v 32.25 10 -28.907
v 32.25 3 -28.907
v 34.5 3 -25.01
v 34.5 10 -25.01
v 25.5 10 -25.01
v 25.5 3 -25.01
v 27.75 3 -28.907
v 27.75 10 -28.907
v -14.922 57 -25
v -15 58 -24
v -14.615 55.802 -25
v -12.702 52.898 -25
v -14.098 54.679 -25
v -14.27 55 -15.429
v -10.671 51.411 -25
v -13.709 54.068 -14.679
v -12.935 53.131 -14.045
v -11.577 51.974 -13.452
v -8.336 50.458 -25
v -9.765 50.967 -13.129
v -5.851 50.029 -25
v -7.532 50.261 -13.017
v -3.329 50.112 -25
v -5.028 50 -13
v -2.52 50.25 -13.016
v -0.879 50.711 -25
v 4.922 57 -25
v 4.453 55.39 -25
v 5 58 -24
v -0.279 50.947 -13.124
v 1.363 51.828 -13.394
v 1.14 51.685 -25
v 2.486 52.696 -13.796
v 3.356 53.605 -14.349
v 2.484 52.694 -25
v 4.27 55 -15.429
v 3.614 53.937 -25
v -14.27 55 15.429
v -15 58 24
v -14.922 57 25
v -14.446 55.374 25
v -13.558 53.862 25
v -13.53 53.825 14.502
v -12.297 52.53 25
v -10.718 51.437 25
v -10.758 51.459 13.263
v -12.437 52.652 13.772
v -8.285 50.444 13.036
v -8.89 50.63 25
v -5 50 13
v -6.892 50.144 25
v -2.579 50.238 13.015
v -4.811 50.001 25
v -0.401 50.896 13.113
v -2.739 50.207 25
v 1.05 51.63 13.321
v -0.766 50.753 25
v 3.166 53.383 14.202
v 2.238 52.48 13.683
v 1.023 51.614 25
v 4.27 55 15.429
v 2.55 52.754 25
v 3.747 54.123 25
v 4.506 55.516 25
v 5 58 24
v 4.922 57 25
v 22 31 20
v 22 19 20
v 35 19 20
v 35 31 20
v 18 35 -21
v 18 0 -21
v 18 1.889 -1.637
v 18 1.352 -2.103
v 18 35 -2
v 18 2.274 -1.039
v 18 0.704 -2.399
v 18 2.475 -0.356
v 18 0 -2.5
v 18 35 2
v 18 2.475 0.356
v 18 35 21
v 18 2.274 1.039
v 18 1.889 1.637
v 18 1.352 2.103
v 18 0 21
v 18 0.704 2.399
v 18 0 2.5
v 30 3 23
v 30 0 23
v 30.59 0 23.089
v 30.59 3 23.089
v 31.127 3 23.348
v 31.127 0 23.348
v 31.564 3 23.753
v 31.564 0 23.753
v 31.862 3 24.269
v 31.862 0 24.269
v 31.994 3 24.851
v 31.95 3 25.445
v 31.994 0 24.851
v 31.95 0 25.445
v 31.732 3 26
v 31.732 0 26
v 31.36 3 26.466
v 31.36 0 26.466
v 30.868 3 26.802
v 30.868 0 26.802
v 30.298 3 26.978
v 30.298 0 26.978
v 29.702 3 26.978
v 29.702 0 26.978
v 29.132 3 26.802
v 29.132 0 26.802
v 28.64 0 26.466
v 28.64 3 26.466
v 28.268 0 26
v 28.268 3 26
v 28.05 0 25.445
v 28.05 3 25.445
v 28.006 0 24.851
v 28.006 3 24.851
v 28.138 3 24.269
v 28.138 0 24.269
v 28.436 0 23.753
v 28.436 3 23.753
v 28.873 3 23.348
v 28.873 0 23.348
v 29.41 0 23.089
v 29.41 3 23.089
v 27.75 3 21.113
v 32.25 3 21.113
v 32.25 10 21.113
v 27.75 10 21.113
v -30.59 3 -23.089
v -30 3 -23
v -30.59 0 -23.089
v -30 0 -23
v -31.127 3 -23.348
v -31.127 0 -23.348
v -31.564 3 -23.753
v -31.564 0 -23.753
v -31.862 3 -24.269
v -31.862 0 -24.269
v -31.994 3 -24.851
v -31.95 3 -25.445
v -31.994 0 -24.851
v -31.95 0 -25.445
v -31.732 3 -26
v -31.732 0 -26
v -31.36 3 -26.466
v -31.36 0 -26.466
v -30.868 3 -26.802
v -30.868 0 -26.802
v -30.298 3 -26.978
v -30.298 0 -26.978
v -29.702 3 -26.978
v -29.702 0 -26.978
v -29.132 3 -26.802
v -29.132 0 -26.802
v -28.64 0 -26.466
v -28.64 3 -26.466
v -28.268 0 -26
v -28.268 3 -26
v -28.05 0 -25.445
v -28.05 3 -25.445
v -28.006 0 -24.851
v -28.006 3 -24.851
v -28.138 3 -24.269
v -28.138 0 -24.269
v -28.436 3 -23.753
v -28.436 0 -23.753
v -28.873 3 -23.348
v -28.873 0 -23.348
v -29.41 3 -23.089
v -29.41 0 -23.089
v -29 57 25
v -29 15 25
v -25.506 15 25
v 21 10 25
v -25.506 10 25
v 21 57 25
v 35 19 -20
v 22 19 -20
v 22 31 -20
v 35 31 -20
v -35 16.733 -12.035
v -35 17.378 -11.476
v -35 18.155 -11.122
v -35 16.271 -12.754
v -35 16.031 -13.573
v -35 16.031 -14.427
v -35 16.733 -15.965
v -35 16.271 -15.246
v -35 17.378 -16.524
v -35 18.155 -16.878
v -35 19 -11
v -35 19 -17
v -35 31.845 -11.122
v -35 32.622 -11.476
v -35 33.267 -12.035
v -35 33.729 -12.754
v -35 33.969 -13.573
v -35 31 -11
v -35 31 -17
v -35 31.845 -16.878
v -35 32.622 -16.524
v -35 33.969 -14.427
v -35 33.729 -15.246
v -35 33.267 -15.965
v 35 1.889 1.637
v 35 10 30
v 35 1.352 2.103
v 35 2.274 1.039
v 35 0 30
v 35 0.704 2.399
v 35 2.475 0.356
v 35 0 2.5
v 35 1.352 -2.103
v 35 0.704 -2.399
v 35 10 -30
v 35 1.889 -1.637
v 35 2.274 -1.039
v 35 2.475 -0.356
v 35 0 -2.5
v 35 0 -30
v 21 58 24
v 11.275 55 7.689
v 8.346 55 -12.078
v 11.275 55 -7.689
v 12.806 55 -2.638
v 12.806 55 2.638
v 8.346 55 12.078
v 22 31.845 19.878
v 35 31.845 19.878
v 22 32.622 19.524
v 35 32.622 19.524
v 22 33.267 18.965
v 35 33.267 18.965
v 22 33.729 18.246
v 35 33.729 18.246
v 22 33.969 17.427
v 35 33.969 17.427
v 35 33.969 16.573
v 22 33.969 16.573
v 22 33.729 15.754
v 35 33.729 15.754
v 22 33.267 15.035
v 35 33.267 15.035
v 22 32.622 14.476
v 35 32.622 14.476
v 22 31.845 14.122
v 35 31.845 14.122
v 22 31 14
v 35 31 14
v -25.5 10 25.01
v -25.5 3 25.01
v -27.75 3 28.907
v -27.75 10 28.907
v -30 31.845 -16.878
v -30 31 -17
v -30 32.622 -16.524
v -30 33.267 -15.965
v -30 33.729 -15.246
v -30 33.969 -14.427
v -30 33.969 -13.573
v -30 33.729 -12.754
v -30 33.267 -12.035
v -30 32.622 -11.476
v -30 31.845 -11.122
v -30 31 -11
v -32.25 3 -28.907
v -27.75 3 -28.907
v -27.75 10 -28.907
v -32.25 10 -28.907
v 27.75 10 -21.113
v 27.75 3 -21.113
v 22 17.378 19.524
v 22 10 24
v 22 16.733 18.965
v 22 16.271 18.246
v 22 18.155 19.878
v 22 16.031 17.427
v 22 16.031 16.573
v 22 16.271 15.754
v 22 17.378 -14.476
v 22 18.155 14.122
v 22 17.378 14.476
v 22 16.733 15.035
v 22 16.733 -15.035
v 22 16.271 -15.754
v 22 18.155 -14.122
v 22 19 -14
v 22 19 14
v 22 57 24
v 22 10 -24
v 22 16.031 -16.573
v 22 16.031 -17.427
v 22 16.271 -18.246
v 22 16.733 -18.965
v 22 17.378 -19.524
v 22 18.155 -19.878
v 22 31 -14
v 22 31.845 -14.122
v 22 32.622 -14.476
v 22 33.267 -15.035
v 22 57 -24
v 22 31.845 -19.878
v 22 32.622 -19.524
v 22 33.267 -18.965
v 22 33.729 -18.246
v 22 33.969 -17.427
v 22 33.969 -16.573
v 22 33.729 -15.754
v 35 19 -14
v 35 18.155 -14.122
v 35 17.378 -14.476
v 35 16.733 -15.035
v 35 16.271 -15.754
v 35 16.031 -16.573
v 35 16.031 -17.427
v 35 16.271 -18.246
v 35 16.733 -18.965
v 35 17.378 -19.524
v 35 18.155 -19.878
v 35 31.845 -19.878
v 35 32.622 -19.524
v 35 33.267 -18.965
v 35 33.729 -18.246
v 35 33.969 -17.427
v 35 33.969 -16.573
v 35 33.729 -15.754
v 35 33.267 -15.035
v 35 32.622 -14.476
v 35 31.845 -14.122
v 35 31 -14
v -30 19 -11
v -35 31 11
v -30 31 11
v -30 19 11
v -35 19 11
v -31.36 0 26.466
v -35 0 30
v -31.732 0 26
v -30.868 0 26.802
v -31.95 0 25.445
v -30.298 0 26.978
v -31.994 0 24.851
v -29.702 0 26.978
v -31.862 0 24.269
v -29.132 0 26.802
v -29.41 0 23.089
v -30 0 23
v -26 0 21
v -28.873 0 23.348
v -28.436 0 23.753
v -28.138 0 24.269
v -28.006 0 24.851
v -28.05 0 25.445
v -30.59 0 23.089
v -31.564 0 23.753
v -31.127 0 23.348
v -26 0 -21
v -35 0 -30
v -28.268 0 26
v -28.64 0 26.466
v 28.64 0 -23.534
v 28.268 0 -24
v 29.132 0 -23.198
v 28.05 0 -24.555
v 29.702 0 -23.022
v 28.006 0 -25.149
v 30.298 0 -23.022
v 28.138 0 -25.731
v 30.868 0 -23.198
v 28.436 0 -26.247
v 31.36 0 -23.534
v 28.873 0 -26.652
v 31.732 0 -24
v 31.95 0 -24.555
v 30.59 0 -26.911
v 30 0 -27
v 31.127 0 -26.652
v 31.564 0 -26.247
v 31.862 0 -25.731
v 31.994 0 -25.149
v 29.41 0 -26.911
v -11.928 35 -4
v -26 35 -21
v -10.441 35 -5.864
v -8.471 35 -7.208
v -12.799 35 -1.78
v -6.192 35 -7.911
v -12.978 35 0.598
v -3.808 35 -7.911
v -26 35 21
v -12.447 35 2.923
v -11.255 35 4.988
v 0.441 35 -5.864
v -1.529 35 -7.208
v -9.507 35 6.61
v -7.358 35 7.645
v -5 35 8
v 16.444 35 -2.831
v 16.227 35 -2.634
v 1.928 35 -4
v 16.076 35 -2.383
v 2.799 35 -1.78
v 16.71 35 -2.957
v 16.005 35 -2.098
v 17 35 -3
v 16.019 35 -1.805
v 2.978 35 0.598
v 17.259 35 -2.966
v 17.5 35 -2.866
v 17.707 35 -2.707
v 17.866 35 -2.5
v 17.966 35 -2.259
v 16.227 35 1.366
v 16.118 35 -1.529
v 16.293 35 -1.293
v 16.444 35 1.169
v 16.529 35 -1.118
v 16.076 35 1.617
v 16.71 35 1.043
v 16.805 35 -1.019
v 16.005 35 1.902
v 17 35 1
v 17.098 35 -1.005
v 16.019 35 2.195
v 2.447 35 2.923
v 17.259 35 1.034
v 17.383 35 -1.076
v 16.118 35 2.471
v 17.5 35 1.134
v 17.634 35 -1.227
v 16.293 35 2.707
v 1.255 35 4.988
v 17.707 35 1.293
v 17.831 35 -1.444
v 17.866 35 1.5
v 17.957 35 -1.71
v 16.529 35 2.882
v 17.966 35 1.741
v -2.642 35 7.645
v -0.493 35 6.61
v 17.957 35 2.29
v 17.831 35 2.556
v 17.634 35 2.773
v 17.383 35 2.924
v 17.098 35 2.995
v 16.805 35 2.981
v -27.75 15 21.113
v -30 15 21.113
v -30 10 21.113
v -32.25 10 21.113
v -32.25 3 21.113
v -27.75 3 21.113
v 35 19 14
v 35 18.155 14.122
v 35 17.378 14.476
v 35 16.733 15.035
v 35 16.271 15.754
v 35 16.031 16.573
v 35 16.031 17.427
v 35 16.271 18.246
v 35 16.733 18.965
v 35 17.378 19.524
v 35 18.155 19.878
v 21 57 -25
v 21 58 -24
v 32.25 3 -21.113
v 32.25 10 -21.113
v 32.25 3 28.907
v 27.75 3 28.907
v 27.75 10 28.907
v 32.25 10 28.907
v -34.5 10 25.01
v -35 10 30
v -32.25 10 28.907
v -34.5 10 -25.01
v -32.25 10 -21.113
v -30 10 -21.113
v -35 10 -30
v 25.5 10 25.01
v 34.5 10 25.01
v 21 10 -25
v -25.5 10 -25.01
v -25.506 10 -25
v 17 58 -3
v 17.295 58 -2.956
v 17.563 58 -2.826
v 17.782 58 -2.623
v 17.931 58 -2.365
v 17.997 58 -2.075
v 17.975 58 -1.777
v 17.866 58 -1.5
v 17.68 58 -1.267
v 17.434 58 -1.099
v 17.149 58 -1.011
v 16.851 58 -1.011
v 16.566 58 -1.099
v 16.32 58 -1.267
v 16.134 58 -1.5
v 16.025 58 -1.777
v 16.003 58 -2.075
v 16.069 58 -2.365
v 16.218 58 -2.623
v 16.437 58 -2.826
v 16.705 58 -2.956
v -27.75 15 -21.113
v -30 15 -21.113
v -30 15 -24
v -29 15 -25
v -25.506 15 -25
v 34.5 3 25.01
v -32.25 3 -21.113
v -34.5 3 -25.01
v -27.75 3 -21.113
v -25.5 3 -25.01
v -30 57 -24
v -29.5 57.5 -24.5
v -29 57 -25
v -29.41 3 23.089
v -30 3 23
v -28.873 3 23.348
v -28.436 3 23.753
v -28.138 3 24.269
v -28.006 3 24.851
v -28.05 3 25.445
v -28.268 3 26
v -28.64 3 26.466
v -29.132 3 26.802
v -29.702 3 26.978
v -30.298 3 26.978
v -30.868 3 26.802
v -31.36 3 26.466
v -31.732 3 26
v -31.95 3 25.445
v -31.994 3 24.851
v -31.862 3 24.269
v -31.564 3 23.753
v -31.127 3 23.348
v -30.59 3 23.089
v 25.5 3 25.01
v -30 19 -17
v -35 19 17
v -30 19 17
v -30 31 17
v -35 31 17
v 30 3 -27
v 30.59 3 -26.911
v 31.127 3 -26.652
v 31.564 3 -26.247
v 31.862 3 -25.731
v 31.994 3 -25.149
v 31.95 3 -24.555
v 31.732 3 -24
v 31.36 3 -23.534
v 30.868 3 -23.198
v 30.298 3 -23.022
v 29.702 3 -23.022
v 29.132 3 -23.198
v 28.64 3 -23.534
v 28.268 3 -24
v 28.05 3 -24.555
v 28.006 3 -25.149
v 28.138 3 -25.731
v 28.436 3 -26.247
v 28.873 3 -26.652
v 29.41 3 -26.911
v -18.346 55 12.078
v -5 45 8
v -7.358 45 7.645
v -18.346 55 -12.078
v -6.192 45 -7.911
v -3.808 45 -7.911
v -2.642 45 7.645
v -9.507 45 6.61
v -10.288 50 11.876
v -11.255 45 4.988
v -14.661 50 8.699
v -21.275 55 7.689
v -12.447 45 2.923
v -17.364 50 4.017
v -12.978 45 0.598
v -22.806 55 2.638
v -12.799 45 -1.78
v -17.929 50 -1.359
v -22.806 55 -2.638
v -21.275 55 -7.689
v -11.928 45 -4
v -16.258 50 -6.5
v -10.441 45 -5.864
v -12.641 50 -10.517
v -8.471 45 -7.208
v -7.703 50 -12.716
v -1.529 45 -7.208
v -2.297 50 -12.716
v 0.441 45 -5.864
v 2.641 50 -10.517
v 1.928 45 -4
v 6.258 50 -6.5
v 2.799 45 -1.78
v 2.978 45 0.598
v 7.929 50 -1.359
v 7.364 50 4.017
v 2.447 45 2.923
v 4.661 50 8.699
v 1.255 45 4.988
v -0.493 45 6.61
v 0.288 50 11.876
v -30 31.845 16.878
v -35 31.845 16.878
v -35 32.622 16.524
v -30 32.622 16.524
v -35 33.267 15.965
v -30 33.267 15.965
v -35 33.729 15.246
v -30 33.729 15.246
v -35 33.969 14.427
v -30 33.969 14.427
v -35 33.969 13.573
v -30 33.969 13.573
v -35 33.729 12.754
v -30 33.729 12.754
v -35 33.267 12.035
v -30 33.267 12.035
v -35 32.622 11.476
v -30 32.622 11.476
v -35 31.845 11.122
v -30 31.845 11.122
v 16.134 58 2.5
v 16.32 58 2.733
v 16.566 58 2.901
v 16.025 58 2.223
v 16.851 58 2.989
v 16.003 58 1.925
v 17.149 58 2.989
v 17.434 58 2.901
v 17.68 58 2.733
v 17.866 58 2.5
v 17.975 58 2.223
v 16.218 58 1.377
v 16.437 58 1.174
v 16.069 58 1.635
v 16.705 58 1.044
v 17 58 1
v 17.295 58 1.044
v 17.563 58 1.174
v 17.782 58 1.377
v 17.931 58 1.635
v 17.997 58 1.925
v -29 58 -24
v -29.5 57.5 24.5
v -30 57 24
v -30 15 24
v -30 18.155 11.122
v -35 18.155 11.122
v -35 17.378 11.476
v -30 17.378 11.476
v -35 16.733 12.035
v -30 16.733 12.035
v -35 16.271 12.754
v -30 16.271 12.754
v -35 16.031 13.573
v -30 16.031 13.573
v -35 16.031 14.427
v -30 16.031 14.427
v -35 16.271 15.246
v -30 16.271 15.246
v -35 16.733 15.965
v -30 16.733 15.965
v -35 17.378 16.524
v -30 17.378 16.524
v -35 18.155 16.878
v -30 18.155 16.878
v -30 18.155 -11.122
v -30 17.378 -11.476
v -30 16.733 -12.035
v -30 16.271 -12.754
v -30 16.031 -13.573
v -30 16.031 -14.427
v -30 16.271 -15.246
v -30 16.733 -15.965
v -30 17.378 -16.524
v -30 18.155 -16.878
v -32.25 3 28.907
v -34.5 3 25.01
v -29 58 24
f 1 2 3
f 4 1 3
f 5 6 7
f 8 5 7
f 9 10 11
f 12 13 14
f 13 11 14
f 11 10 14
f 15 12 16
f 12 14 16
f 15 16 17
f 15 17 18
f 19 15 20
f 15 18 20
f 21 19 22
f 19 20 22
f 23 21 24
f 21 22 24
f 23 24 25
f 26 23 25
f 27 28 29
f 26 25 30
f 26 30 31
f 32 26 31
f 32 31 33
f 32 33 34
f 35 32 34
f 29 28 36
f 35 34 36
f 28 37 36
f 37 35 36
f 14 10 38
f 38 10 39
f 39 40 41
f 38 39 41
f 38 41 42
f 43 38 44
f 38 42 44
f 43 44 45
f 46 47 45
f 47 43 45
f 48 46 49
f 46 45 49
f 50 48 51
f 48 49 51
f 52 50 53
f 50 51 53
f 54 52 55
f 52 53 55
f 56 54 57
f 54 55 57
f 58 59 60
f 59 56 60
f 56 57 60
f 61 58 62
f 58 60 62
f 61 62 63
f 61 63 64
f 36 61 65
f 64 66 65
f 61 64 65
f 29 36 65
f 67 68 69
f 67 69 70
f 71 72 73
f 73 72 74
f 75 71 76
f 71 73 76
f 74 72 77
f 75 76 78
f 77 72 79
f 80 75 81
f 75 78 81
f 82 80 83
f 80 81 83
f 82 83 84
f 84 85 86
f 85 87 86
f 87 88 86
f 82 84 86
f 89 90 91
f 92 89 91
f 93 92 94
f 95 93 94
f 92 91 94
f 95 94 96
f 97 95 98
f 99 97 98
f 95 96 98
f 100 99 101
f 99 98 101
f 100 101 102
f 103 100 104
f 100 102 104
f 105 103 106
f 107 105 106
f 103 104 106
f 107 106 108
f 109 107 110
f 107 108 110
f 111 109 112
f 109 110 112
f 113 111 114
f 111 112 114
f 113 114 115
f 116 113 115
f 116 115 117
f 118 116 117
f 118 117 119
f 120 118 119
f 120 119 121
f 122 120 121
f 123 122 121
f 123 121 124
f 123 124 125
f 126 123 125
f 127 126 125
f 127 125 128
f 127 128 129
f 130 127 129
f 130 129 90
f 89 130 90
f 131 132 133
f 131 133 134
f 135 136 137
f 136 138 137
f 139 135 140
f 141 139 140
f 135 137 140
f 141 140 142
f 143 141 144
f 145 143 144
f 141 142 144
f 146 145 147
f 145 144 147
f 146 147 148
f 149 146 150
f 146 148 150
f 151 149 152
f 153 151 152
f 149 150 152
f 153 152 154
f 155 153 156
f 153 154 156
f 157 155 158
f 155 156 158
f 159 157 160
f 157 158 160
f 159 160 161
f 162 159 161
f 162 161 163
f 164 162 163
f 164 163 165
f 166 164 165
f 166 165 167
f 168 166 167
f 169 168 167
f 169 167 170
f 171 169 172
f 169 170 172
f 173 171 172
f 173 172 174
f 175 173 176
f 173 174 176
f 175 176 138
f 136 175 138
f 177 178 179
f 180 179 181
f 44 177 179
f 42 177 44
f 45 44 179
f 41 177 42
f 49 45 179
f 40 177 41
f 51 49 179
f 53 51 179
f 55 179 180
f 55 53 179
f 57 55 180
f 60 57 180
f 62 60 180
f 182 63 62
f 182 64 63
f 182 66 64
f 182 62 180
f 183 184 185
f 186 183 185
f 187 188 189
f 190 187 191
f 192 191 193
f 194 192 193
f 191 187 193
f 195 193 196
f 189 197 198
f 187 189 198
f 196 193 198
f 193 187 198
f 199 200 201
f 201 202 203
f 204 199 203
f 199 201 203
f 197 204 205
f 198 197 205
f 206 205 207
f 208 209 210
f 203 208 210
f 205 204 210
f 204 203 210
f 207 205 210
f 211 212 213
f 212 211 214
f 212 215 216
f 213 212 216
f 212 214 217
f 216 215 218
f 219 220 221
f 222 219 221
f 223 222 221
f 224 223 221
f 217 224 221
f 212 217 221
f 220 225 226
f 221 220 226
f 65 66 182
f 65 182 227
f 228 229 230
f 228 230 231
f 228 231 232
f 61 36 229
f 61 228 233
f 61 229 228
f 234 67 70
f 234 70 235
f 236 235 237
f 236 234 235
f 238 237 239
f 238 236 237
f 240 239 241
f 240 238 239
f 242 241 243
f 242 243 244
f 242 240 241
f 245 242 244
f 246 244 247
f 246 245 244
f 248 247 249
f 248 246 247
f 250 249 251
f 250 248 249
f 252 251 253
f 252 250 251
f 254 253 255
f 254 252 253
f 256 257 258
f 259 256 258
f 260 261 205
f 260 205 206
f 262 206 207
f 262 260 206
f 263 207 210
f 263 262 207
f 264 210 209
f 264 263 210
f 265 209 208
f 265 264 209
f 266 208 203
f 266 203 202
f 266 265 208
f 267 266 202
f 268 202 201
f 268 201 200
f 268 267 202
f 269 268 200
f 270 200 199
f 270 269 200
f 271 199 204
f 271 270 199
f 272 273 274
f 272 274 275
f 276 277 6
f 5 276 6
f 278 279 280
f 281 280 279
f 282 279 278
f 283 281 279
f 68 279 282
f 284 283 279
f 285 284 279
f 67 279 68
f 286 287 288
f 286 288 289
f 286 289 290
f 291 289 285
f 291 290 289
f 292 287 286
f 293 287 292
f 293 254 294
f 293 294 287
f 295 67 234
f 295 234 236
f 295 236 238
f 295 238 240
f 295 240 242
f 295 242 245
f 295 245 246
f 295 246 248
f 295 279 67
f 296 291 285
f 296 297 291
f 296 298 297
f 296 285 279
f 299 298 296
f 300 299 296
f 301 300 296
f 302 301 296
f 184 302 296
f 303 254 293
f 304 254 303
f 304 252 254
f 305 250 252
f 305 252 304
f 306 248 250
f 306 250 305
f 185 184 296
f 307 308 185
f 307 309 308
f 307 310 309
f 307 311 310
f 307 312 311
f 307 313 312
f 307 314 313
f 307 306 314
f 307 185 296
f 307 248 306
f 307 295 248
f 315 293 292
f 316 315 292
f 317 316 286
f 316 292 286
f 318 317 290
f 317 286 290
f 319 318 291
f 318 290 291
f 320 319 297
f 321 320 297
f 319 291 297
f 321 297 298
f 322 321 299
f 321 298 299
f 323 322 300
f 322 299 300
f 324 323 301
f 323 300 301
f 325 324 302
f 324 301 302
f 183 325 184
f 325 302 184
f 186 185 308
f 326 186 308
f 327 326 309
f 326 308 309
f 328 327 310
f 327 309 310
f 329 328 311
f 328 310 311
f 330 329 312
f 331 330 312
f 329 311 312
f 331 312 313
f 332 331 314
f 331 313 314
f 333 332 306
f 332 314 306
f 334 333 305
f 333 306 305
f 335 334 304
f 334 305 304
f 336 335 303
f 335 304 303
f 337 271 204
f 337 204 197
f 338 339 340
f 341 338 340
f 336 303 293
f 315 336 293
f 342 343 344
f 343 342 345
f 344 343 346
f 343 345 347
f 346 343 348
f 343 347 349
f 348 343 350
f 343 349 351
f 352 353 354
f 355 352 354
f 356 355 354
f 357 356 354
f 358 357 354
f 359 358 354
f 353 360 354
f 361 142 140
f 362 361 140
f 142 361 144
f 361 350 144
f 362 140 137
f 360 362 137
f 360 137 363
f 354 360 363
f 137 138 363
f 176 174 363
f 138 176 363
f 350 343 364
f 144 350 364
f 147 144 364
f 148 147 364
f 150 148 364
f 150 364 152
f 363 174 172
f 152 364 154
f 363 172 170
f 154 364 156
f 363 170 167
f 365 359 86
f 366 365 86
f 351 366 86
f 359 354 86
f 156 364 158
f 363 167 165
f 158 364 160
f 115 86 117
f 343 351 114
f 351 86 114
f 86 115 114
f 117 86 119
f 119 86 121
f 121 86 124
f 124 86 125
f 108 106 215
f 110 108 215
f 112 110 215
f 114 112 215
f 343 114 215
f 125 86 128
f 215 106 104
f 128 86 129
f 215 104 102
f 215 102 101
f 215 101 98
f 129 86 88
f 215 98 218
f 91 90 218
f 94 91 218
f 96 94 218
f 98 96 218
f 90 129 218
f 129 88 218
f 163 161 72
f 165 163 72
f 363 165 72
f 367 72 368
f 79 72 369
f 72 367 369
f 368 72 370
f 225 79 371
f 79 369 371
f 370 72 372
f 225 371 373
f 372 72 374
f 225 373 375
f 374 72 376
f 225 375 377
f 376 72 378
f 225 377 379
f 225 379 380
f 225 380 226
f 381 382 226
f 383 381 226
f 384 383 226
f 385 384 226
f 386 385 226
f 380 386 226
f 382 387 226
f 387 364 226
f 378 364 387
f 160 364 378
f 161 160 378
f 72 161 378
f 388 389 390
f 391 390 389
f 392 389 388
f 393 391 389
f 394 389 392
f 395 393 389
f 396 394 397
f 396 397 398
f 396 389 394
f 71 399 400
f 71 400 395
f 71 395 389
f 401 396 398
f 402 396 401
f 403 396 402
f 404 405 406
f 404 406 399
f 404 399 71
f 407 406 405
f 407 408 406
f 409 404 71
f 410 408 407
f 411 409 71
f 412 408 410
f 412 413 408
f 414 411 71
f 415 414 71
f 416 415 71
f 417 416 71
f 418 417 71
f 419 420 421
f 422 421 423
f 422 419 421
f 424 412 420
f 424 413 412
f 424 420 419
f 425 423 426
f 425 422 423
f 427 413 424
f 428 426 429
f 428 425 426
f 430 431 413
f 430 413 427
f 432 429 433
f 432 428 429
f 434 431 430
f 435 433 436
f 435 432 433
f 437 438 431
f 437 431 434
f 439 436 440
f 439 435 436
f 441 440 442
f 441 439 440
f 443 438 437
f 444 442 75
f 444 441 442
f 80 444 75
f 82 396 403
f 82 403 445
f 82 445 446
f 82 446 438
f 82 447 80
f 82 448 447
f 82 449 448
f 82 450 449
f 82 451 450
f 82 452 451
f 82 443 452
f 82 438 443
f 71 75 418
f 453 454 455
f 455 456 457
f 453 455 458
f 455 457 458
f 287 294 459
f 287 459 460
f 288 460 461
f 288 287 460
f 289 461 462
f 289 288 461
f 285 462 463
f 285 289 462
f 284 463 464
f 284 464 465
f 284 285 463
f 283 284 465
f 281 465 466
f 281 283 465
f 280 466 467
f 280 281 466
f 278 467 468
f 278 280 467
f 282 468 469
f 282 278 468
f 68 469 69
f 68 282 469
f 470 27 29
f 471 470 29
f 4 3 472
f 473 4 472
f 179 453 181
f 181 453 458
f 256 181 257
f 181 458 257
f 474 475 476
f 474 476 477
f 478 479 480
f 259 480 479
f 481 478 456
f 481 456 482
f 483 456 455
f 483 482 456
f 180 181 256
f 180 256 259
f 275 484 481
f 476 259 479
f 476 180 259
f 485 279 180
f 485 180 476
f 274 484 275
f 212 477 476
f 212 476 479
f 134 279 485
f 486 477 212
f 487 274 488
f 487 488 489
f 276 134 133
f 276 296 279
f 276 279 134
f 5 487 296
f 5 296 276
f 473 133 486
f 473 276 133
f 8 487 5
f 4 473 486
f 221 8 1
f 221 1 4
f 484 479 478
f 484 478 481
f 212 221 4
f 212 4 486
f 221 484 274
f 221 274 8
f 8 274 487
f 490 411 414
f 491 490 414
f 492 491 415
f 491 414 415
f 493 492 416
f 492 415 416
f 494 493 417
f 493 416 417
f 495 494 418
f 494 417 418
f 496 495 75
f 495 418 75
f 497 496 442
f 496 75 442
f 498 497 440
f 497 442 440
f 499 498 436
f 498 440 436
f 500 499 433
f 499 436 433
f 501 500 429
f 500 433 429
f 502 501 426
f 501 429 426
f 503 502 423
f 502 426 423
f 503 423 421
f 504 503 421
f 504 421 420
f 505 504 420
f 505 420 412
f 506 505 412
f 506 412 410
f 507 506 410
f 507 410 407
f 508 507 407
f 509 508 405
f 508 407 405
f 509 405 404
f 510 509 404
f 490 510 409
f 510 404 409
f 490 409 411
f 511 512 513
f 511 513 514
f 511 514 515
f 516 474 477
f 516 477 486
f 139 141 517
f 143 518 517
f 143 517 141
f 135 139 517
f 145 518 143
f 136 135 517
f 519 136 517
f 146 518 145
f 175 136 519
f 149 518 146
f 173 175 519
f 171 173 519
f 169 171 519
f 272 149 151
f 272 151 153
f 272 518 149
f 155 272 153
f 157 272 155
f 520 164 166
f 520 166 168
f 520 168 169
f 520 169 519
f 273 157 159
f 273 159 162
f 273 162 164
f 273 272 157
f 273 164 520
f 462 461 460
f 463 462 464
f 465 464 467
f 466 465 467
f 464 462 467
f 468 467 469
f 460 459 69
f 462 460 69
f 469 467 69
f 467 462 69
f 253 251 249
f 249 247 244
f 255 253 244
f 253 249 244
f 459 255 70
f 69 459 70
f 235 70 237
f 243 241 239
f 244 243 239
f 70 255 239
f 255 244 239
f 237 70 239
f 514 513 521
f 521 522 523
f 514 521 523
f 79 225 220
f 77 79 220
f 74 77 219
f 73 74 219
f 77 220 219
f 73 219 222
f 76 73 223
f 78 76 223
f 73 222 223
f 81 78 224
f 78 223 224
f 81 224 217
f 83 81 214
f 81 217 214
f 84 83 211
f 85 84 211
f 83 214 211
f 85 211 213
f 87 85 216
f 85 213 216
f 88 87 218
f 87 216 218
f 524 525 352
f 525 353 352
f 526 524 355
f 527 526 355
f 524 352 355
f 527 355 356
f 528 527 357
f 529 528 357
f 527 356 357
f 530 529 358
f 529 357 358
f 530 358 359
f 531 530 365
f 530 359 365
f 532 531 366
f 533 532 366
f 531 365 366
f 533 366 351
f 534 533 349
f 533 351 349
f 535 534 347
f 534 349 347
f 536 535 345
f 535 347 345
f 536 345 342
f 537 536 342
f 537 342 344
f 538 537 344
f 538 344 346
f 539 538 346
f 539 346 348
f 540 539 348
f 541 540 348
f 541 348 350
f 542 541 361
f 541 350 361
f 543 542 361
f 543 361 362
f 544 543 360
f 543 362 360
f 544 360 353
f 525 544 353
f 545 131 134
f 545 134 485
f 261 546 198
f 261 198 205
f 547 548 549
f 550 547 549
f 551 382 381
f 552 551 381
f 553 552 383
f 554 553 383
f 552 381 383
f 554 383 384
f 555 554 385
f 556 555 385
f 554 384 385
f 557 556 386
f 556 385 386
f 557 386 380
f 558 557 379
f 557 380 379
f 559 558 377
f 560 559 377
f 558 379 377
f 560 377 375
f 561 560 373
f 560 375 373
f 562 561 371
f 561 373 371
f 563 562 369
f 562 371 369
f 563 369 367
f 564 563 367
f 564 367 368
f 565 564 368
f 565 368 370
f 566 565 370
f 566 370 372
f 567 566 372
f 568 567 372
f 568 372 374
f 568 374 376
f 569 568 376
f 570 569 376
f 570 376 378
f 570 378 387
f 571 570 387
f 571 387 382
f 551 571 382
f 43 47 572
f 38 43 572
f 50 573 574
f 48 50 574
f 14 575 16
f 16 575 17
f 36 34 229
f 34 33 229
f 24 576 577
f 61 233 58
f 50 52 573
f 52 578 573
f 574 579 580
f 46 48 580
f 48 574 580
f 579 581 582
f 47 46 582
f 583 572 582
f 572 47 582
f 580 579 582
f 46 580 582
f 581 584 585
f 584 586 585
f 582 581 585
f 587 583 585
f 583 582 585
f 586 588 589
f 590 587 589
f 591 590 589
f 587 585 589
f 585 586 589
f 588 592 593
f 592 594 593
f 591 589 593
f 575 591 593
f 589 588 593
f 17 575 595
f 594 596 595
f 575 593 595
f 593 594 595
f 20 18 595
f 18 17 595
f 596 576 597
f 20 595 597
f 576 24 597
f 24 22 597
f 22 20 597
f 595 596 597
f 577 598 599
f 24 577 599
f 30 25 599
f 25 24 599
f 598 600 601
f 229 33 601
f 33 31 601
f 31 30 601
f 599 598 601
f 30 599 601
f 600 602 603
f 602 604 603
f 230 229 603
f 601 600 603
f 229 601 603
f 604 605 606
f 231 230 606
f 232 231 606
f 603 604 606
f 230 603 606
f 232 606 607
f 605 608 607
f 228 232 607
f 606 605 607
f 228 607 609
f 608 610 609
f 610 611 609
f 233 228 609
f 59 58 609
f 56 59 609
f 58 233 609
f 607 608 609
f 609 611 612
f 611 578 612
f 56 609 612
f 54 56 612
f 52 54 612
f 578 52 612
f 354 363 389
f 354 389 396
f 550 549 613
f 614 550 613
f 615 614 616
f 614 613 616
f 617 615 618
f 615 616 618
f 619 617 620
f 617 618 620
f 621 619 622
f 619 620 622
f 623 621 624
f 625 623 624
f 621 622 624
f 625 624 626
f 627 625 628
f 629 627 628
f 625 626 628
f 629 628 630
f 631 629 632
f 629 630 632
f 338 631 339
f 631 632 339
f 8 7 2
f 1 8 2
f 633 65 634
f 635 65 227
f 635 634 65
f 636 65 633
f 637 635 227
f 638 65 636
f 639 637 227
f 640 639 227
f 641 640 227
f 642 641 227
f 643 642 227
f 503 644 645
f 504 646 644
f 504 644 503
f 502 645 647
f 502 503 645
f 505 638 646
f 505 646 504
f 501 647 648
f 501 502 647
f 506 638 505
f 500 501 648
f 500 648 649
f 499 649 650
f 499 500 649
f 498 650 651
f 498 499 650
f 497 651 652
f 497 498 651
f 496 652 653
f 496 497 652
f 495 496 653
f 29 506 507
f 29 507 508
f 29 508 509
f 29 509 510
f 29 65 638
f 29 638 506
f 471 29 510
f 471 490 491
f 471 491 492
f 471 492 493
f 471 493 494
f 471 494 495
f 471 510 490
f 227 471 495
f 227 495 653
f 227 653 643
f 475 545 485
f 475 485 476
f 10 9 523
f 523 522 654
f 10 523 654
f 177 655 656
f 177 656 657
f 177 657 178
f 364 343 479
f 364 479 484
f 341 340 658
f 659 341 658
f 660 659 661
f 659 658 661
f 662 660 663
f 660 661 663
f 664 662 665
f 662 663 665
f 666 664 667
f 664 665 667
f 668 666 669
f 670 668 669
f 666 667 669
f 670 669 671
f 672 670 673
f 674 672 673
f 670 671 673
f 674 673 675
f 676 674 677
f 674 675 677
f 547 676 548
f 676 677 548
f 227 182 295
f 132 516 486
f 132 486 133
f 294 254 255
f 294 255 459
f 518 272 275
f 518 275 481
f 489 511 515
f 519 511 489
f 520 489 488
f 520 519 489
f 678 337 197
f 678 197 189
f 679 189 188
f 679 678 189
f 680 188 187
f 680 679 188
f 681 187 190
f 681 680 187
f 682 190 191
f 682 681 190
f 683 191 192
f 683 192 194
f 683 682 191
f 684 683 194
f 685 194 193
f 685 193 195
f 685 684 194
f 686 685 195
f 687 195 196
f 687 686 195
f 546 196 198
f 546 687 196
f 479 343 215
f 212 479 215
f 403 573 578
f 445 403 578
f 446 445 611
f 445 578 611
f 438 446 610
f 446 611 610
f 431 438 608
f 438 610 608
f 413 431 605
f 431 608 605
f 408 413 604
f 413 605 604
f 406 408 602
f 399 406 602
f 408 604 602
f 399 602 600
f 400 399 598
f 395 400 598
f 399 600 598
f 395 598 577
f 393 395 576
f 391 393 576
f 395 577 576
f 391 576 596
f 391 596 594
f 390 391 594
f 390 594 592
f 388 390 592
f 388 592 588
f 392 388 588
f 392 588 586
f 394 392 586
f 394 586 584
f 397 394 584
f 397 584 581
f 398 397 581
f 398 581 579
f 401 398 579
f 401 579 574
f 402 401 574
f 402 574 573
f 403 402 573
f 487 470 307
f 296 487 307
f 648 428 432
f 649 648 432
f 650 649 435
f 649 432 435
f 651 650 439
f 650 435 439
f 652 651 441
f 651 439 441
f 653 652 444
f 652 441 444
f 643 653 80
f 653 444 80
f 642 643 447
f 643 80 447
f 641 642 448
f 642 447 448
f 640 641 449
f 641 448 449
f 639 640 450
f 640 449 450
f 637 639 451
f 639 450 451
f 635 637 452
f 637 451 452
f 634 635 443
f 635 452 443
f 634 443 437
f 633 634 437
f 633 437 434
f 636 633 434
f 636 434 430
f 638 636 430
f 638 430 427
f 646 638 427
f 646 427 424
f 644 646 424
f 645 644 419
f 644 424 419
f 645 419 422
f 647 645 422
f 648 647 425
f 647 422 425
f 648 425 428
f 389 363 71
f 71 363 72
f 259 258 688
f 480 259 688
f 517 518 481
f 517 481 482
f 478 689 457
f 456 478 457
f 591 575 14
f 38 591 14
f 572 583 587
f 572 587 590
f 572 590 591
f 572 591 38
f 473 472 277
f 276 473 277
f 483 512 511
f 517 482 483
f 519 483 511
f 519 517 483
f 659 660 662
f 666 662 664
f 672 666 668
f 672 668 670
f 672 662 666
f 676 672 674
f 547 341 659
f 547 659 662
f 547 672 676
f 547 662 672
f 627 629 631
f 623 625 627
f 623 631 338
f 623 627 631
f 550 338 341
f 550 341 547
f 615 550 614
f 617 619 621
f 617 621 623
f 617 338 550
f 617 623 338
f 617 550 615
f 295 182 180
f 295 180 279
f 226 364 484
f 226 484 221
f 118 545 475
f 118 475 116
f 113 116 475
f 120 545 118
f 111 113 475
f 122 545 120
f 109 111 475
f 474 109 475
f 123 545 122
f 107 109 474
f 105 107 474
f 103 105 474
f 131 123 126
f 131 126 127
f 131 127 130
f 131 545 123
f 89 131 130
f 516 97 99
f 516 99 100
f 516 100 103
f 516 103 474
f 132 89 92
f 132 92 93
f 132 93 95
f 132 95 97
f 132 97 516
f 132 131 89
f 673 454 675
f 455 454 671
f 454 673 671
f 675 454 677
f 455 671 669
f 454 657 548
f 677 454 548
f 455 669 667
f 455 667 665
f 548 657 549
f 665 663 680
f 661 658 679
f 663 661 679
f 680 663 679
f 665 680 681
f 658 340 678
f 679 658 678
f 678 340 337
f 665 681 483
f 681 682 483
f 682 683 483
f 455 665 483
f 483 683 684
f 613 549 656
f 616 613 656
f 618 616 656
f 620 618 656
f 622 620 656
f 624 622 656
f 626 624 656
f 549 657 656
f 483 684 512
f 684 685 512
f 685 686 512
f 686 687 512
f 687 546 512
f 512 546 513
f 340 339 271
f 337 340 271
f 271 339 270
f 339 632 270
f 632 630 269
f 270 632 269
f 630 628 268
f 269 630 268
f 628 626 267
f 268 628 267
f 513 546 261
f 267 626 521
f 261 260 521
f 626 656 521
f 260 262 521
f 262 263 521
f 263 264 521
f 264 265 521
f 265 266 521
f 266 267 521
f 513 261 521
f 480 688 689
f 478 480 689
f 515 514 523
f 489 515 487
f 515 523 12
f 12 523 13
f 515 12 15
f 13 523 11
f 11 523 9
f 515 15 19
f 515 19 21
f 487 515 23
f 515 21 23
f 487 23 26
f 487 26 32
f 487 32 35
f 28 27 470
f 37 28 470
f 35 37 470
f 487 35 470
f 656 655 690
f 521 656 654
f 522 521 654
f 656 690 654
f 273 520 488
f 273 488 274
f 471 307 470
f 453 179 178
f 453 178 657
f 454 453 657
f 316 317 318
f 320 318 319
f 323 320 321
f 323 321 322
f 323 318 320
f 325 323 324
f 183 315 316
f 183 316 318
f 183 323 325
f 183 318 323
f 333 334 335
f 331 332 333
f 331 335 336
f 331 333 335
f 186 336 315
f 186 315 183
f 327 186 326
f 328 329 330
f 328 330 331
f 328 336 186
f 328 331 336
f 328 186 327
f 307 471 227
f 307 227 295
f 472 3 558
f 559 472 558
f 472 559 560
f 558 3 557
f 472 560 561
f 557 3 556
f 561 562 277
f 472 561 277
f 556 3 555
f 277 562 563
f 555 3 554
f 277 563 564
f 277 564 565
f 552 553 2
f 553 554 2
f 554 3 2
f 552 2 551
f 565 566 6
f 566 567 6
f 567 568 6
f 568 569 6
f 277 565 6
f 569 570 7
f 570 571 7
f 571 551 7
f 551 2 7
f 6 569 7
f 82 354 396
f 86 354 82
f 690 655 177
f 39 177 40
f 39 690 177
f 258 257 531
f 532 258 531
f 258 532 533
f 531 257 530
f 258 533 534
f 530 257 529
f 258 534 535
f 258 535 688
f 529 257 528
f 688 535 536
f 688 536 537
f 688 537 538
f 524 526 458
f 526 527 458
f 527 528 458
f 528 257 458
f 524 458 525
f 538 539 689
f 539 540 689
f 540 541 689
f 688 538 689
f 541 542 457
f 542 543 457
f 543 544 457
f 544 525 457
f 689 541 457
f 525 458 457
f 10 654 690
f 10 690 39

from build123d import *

# Parameters (mm, degrees)
SKETCH_1_W               = 70
SKETCH_1_H               = 60
EXTRUDE_1_DEPTH          = 58
SKETCH_2_W               = 44
SKETCH_2_H               = 42
CUT_EXTRUDE_1_DEPTH      = 35
SKETCH_3_W               = 70
SKETCH_3_H               = 60
SKETCH_3_W_2             = 52
SKETCH_3_H_2             = 50
CUT_EXTRUDE_3_DEPTH      = 48
SKETCH_4_R               = 8
CUT_EXTRUDE_4_DEPTH      = 75.087785768
SKETCH_5_RX              = 10
SKETCH_5_RY              = 8
CUT_EXTRUDE_5_DEPTH      = 88.258237433
SKETCH_6_R               = 8
CUT_EXTRUDE_6_DEPTH      = 10
CUT_EXTRUDE_6_DRAFT      = 45
EXTRUDE_2_DEPTH          = 5
EXTRUDE_3_DEPTH          = 13
SKETCH_11_R              = 1
CUT_EXTRUDE_7_DEPTH      = 58.879184514
CUT_EXTRUDE_8_REACH      = 97.729
SKETCH_13_R              = 2.5
CHAMFER_1_SIZE           = 1
CUT_EXTRUDE_9_DEPTH      = 5
CUT_EXTRUDE_9_DEPTH_BACK = 7
CUT_EXTRUDE_11_REACH     = 76.088
SKETCH_15_R              = 2


with BuildPart() as part:
    # 草图1 → 凸台-拉伸1 (new body)
    with BuildSketch(Plane(origin=(0, 0, 0), x_dir=(1, 0, 0), z_dir=(0, 1, 0))):
        Rectangle(SKETCH_1_W, SKETCH_1_H)
    extrude(amount=EXTRUDE_1_DEPTH)

    # 草图2 → 切除-拉伸1 (cut)
    with BuildSketch(Plane.XZ):
        with Locations((-4, 0)):
            Rectangle(SKETCH_2_W, SKETCH_2_H)
    extrude(amount=-CUT_EXTRUDE_1_DEPTH, mode=Mode.SUBTRACT)

    # 草图3 → 切除-拉伸3 (cut)
    with BuildSketch(Plane(origin=(0, 58, 0), x_dir=(1, 0, 0), z_dir=(0, 1, 0))):
        Rectangle(SKETCH_3_W, SKETCH_3_H)
        with Locations((-4, 0)):
            Rectangle(SKETCH_3_W_2, SKETCH_3_H_2, mode=Mode.SUBTRACT)
    extrude(amount=-CUT_EXTRUDE_3_DEPTH, mode=Mode.SUBTRACT)

    # 草图4 → 切除-拉伸4 (cut, through all)
    with BuildSketch(Plane(origin=(0, 58, 0), x_dir=(1, 0, 0), z_dir=(0, 1, 0))):
        with Locations(Location((-5, 0, 0), (0, 0, 270))):
            Circle(SKETCH_4_R)
    extrude(amount=-CUT_EXTRUDE_4_DEPTH, mode=Mode.SUBTRACT)

    # 草图5 → 切除-拉伸5 (cut, through all)
    with BuildSketch(Plane.XY.offset(25)):
        with Locations((-5, 58)):
            Ellipse(SKETCH_5_RX, SKETCH_5_RY)
    extrude(amount=-CUT_EXTRUDE_5_DEPTH, mode=Mode.SUBTRACT)


with BuildPart() as cut_extrude_6_tool:
    # 草图6 → 切除-拉伸6 (with draft: the straight prism first)
    with BuildSketch(Plane(origin=(0, 45, 0), x_dir=(-1, 0, 0), z_dir=(0, -1, 0))):
        with Locations(Location((5, 0, 0), (0, 0, 270))):
            Circle(SKETCH_6_R)
    extrude(amount=-CUT_EXTRUDE_6_DEPTH)
    # 切除-拉伸6: the draft: its side faces are tilted about the plane it starts from
    cut_extrude_6_sides = [cut_extrude_6_tool.faces().sort_by_distance(p)[0] for p in [
        (-5, 50, -8),
    ]]
    draft(cut_extrude_6_sides, Plane(origin=(0, 45, 0), x_dir=(-1, 0, 0), z_dir=(0, -1, 0)), CUT_EXTRUDE_6_DRAFT)


with BuildPart() as part_1:
    add(part.part)

    # 切除-拉伸6: cut by cut_extrude_6_tool
    add(cut_extrude_6_tool.part, mode=Mode.SUBTRACT)

    # 草图9 → 凸台-拉伸2 (add)
    with BuildSketch(Plane.ZY.offset(30)):
        with BuildLine():
            Line((-11, 31), (-11, 19))
            ThreePointArc((-11, 19), (-14, 16), (-17, 19))
            Line((-17, 19), (-17, 31))
            ThreePointArc((-17, 31), (-14, 34), (-11, 31))
        make_face()
        with BuildLine():
            Line((11, 31), (11, 19))
            ThreePointArc((11, 19), (14, 16), (17, 19))
            Line((17, 19), (17, 31))
            ThreePointArc((17, 31), (14, 34), (11, 31))
        make_face()
    extrude(amount=EXTRUDE_2_DEPTH)

    # 草图10 → 凸台-拉伸3 (add)
    with BuildSketch(Plane(origin=(22, 0, 0), x_dir=(0, 0, -1), z_dir=(1, 0, 0))):
        with BuildLine():
            Line((-14, 31), (-14, 19))
            ThreePointArc((-14, 19), (-17, 16), (-20, 19))
            Line((-20, 19), (-20, 31))
            ThreePointArc((-20, 31), (-17, 34), (-14, 31))
        make_face()
        with BuildLine():
            Line((14, 31), (14, 19))
            ThreePointArc((14, 19), (17, 16), (20, 19))
            Line((20, 19), (20, 31))
            ThreePointArc((20, 31), (17, 34), (14, 31))
        make_face()
    extrude(amount=EXTRUDE_3_DEPTH)

    # 草图11 → 切除-拉伸7 (cut, through all)
    with BuildSketch(Plane.XZ.offset(-35)):
        with Locations(Location((17, -2, 0), (0, 0, 270))):
            Circle(SKETCH_11_R)
        with Locations(Location((17, 2, 0), (0, 0, 270))):
            Circle(SKETCH_11_R)
    extrude(amount=-CUT_EXTRUDE_7_DEPTH, mode=Mode.SUBTRACT)

    # 草图13 → 切除-拉伸8 (cut, up to next)
    with BuildSketch(Plane(origin=(35, 0, 0), x_dir=(0, 0, -1), z_dir=(1, 0, 0)), mode=Mode.PRIVATE) as cut_extrude_8_sk1:
        Circle(SKETCH_13_R)
    cut_extrude_8_tool1 = extrude(cut_extrude_8_sk1.sketch, amount=-CUT_EXTRUDE_8_REACH, mode=Mode.PRIVATE) & part_1.part
    add(cut_extrude_8_tool1.solids().sort_by_distance((35, 0, 0))[0], mode=Mode.SUBTRACT)

    # 倒角1
    chamfer_1_edges = [part_1.edges().sort_by_distance(p)[0] for p in [
        (-30, 58, 0),
        (-22.5, 58, 25),
    ]]
    chamfer(chamfer_1_edges, length=CHAMFER_1_SIZE)

    # 倒角2
    # the kernel refuses this chamfer: 1 mm, written as the material it takes off along each edge
    with BuildSketch(Plane(origin=(21.333333333, 57.333333333, -24.333333333), x_dir=(-0.7071067811865475, 0, -0.7071067811865475), z_dir=(0.5773502691896258, 0.5773502691896258, -0.5773502691896258))) as chamfer_2_piece_1:
        Polygon((-0.707106781, -0.40824829), (0.707106781, -0.40824829), (0, 0.816496581), align=None)
    extrude(amount=1.270170592, mode=Mode.SUBTRACT)
    with BuildSketch(Plane(origin=(21.333333333, 57.333333333, 24.333333333), x_dir=(-0.7071067811865475, 0, 0.7071067811865475), z_dir=(0.5773502691896258, 0.5773502691896258, 0.5773502691896258))) as chamfer_2_piece_2:
        Polygon((-0.707106781, 0.40824829), (0.707106781, 0.40824829), (0, -0.816496581), align=None)
    extrude(amount=1.270170592, mode=Mode.SUBTRACT)
    with BuildSketch(Plane(origin=(-30, 59.571682988, -25), x_dir=(-0.027495876610585647, 0, 0.9996219169112968), z_dir=(0, -1, 0))) as chamfer_2_piece_3:
        with BuildLine():
            Line((1.028673195, 0), (-0.056547155, -1.027117794))
            Line((-0.056547155, -1.027117794), (-0.076539593, -1.026567876))
            ThreePointArc((-0.076539593, -1.026567876), (-0.034129227, -0.51339783), (-0.019992438, 0.000549918))
            Line((-0.019992438, 0.000549918), (0.000549918, 0.019992438))
            ThreePointArc((0.000549918, 0.019992438), (0.514497665, 0.00585565), (1.029223113, 0.019992438))
            Line((1.029223113, 0.019992438), (1.028673195, 0))
        make_face()
    extrude(amount=49.571682988, mode=Mode.SUBTRACT)
    with BuildSketch(Plane(origin=(-30, 59.571682988, 25), x_dir=(-0.027495876610585647, 0, -0.9996219169112968), z_dir=(0, -1, 0))) as chamfer_2_piece_4:
        with BuildLine():
            Line((1.028673195, 0), (-0.056547155, 1.027117794))
            Line((-0.056547155, 1.027117794), (-0.076539593, 1.026567876))
            ThreePointArc((-0.076539593, 1.026567876), (-0.034129227, 0.51339783), (-0.019992438, -0.000549918))
            Line((-0.019992438, -0.000549918), (0.000549918, -0.019992438))
            ThreePointArc((0.000549918, -0.019992438), (0.514497665, -0.00585565), (1.029223113, -0.019992438))
            Line((1.029223113, -0.019992438), (1.028673195, 0))
        make_face()
    extrude(amount=49.571682988, mode=Mode.SUBTRACT)
    with BuildSketch(Plane(origin=(22, 60.571682988, -25), x_dir=(-0.9996219169112968, 0, -0.027495876610585647), z_dir=(0, -1, 0))) as chamfer_2_piece_5:
        with BuildLine():
            Line((1.028673195, 0), (-0.056547155, -1.027117794))
            Line((-0.056547155, -1.027117794), (-0.076539593, -1.026567876))
            ThreePointArc((-0.076539593, -1.026567876), (-0.034129227, -0.51339783), (-0.019992438, 0.000549918))
            Line((-0.019992438, 0.000549918), (0.000549918, 0.019992438))
            ThreePointArc((0.000549918, 0.019992438), (0.514497665, 0.00585565), (1.029223113, 0.019992438))
            Line((1.029223113, 0.019992438), (1.028673195, 0))
        make_face()
    extrude(amount=50.571682988, mode=Mode.SUBTRACT)
    with BuildSketch(Plane(origin=(22, 60.571682988, 25), x_dir=(-0.9996219169112968, 0, 0.027495876610585647), z_dir=(0, -1, 0))) as chamfer_2_piece_6:
        with BuildLine():
            Line((1.028673195, 0), (-0.056547155, 1.027117794))
            Line((-0.056547155, 1.027117794), (-0.076539593, 1.026567876))
            ThreePointArc((-0.076539593, 1.026567876), (-0.034129227, 0.51339783), (-0.019992438, -0.000549918))
            Line((-0.019992438, -0.000549918), (0.000549918, -0.019992438))
            ThreePointArc((0.000549918, -0.019992438), (0.514497665, -0.00585565), (1.029223113, -0.019992438))
            Line((1.029223113, -0.019992438), (1.028673195, 0))
        make_face()
    extrude(amount=50.571682988, mode=Mode.SUBTRACT)
    with BuildSketch(Plane(origin=(24.571682988, 58, 25), x_dir=(0, -0.9996219169112968, 0.02749587661058555), z_dir=(-1, 0, 0)), Plane(origin=(2.428317012, 58, -25), x_dir=(0, -0.9996219169112968, -0.02749587661058555), z_dir=(1, 0, 0))) as chamfer_2_piece_7:
        with BuildLine():
            Line((1.028673195, 0), (-0.056547155, -1.027117794))
            Line((-0.056547155, -1.027117794), (-0.076539593, -1.026567876))
            ThreePointArc((-0.076539593, -1.026567876), (-0.034129227, -0.51339783), (-0.019992438, 0.000549918))
            Line((-0.019992438, 0.000549918), (0.000549918, 0.019992438))
            ThreePointArc((0.000549918, 0.019992438), (0.514497665, 0.00585565), (1.029223113, 0.019992438))
            Line((1.029223113, 0.019992438), (1.028673195, 0))
        make_face()
    extrude(amount=22.143365976, mode=Mode.SUBTRACT)
    with BuildSketch(Plane(origin=(22, 58, -27.571682988), x_dir=(-0.9996219169112968, 0.0274958766105891, 0), z_dir=(0, 0, 1))) as chamfer_2_piece_8:
        with BuildLine():
            Line((1.028673195, 0), (-0.056547155, 1.027117794))
            Line((-0.056547155, 1.027117794), (-0.076539593, 1.026567876))
            ThreePointArc((-0.076539593, 1.026567876), (-0.034129227, 0.51339783), (-0.019992438, -0.000549918))
            Line((-0.019992438, -0.000549918), (0.000549918, -0.019992438))
            ThreePointArc((0.000549918, -0.019992438), (0.514497665, -0.00585565), (1.029223113, -0.019992438))
            Line((1.029223113, -0.019992438), (1.028673195, 0))
        make_face()
    extrude(amount=55.143365976, mode=Mode.SUBTRACT)
    with BuildSketch(Plane(origin=(-31.571682988, 58, -25), x_dir=(0, -0.9996219169112968, -0.02749587661058555), z_dir=(1, 0, 0))) as chamfer_2_piece_9:
        with BuildLine():
            Line((1.028673195, 0), (-0.056547155, -1.027117794))
            Line((-0.056547155, -1.027117794), (-0.076539593, -1.026567876))
            ThreePointArc((-0.076539593, -1.026567876), (-0.034129227, -0.51339783), (-0.019992438, 0.000549918))
            Line((-0.019992438, 0.000549918), (0.000549918, 0.019992438))
            ThreePointArc((0.000549918, 0.019992438), (0.514497665, 0.00585565), (1.029223113, 0.019992438))
            Line((1.029223113, 0.019992438), (1.028673195, 0))
        make_face()
    extrude(amount=19.143365976, mode=Mode.SUBTRACT)

    # 草图14 → 切除-拉伸9 (cut, two sides: drawn at the far end of the back side and taken through both)
    with BuildSketch(Plane(origin=(0, 10, 0), x_dir=(1, 0, 0), z_dir=(0, 1, 0)).offset(-CUT_EXTRUDE_9_DEPTH_BACK)):
        Polygon((25.5, 25.010316584), (27.75, 28.907430901), (32.25, 28.907430901), (34.5, 25.010316584), (32.25, 21.113202267), (27.75, 21.113202267), align=None)
        Polygon((-27.75, 21.113202267), (-25.5, 25.010316584), (-27.75, 28.907430901), (-32.25, 28.907430901), (-34.5, 25.010316584), (-32.25, 21.113202267), align=None)
        Polygon((27.75, -28.907430901), (32.25, -28.907430901), (34.5, -25.010316584), (32.25, -21.113202267), (27.75, -21.113202267), (25.5, -25.010316584), align=None)
        Polygon((-32.25, -21.113202267), (-27.75, -21.113202267), (-25.5, -25.010316584), (-27.75, -28.907430901), (-32.25, -28.907430901), (-34.5, -25.010316584), align=None)
    extrude(amount=CUT_EXTRUDE_9_DEPTH + CUT_EXTRUDE_9_DEPTH_BACK, mode=Mode.SUBTRACT)

    # 草图15 → 切除-拉伸11 (cut, up to next)
    with BuildSketch(Plane.XZ, mode=Mode.PRIVATE) as cut_extrude_11_sk1:
        with Locations(Location((-30, 25, 0), (0, 0, 270))):
            Circle(SKETCH_15_R)
    cut_extrude_11_tool1 = extrude(cut_extrude_11_sk1.sketch, amount=-CUT_EXTRUDE_11_REACH, mode=Mode.PRIVATE) & part_1.part
    # 草图15 → 切除-拉伸11 (cut, up to next)
    with BuildSketch(Plane.XZ, mode=Mode.PRIVATE) as cut_extrude_11_sk2:
        with Locations(Location((30, 25, 0), (0, 0, 270))):
            Circle(SKETCH_15_R)
    cut_extrude_11_tool2 = extrude(cut_extrude_11_sk2.sketch, amount=-CUT_EXTRUDE_11_REACH, mode=Mode.PRIVATE) & part_1.part
    # 草图15 → 切除-拉伸11 (cut, up to next)
    with BuildSketch(Plane.XZ, mode=Mode.PRIVATE) as cut_extrude_11_sk3:
        with Locations(Location((30, -25, 0), (0, 0, 270))):
            Circle(SKETCH_15_R)
    cut_extrude_11_tool3 = extrude(cut_extrude_11_sk3.sketch, amount=-CUT_EXTRUDE_11_REACH, mode=Mode.PRIVATE) & part_1.part
    # 草图15 → 切除-拉伸11 (cut, up to next)
    with BuildSketch(Plane.XZ, mode=Mode.PRIVATE) as cut_extrude_11_sk4:
        with Locations(Location((-30, -25, 0), (0, 0, 90))):
            Circle(SKETCH_15_R)
    cut_extrude_11_tool4 = extrude(cut_extrude_11_sk4.sketch, amount=-CUT_EXTRUDE_11_REACH, mode=Mode.PRIVATE) & part_1.part
    add(cut_extrude_11_tool1.solids().sort_by_distance((-30, 0, 25))[0], mode=Mode.SUBTRACT)
    add(cut_extrude_11_tool2.solids().sort_by_distance((30, 0, 25))[0], mode=Mode.SUBTRACT)
    add(cut_extrude_11_tool3.solids().sort_by_distance((30, 0, -25))[0], mode=Mode.SUBTRACT)
    add(cut_extrude_11_tool4.solids().sort_by_distance((-30, 0, -25))[0], mode=Mode.SUBTRACT)


solid = part_1.part
